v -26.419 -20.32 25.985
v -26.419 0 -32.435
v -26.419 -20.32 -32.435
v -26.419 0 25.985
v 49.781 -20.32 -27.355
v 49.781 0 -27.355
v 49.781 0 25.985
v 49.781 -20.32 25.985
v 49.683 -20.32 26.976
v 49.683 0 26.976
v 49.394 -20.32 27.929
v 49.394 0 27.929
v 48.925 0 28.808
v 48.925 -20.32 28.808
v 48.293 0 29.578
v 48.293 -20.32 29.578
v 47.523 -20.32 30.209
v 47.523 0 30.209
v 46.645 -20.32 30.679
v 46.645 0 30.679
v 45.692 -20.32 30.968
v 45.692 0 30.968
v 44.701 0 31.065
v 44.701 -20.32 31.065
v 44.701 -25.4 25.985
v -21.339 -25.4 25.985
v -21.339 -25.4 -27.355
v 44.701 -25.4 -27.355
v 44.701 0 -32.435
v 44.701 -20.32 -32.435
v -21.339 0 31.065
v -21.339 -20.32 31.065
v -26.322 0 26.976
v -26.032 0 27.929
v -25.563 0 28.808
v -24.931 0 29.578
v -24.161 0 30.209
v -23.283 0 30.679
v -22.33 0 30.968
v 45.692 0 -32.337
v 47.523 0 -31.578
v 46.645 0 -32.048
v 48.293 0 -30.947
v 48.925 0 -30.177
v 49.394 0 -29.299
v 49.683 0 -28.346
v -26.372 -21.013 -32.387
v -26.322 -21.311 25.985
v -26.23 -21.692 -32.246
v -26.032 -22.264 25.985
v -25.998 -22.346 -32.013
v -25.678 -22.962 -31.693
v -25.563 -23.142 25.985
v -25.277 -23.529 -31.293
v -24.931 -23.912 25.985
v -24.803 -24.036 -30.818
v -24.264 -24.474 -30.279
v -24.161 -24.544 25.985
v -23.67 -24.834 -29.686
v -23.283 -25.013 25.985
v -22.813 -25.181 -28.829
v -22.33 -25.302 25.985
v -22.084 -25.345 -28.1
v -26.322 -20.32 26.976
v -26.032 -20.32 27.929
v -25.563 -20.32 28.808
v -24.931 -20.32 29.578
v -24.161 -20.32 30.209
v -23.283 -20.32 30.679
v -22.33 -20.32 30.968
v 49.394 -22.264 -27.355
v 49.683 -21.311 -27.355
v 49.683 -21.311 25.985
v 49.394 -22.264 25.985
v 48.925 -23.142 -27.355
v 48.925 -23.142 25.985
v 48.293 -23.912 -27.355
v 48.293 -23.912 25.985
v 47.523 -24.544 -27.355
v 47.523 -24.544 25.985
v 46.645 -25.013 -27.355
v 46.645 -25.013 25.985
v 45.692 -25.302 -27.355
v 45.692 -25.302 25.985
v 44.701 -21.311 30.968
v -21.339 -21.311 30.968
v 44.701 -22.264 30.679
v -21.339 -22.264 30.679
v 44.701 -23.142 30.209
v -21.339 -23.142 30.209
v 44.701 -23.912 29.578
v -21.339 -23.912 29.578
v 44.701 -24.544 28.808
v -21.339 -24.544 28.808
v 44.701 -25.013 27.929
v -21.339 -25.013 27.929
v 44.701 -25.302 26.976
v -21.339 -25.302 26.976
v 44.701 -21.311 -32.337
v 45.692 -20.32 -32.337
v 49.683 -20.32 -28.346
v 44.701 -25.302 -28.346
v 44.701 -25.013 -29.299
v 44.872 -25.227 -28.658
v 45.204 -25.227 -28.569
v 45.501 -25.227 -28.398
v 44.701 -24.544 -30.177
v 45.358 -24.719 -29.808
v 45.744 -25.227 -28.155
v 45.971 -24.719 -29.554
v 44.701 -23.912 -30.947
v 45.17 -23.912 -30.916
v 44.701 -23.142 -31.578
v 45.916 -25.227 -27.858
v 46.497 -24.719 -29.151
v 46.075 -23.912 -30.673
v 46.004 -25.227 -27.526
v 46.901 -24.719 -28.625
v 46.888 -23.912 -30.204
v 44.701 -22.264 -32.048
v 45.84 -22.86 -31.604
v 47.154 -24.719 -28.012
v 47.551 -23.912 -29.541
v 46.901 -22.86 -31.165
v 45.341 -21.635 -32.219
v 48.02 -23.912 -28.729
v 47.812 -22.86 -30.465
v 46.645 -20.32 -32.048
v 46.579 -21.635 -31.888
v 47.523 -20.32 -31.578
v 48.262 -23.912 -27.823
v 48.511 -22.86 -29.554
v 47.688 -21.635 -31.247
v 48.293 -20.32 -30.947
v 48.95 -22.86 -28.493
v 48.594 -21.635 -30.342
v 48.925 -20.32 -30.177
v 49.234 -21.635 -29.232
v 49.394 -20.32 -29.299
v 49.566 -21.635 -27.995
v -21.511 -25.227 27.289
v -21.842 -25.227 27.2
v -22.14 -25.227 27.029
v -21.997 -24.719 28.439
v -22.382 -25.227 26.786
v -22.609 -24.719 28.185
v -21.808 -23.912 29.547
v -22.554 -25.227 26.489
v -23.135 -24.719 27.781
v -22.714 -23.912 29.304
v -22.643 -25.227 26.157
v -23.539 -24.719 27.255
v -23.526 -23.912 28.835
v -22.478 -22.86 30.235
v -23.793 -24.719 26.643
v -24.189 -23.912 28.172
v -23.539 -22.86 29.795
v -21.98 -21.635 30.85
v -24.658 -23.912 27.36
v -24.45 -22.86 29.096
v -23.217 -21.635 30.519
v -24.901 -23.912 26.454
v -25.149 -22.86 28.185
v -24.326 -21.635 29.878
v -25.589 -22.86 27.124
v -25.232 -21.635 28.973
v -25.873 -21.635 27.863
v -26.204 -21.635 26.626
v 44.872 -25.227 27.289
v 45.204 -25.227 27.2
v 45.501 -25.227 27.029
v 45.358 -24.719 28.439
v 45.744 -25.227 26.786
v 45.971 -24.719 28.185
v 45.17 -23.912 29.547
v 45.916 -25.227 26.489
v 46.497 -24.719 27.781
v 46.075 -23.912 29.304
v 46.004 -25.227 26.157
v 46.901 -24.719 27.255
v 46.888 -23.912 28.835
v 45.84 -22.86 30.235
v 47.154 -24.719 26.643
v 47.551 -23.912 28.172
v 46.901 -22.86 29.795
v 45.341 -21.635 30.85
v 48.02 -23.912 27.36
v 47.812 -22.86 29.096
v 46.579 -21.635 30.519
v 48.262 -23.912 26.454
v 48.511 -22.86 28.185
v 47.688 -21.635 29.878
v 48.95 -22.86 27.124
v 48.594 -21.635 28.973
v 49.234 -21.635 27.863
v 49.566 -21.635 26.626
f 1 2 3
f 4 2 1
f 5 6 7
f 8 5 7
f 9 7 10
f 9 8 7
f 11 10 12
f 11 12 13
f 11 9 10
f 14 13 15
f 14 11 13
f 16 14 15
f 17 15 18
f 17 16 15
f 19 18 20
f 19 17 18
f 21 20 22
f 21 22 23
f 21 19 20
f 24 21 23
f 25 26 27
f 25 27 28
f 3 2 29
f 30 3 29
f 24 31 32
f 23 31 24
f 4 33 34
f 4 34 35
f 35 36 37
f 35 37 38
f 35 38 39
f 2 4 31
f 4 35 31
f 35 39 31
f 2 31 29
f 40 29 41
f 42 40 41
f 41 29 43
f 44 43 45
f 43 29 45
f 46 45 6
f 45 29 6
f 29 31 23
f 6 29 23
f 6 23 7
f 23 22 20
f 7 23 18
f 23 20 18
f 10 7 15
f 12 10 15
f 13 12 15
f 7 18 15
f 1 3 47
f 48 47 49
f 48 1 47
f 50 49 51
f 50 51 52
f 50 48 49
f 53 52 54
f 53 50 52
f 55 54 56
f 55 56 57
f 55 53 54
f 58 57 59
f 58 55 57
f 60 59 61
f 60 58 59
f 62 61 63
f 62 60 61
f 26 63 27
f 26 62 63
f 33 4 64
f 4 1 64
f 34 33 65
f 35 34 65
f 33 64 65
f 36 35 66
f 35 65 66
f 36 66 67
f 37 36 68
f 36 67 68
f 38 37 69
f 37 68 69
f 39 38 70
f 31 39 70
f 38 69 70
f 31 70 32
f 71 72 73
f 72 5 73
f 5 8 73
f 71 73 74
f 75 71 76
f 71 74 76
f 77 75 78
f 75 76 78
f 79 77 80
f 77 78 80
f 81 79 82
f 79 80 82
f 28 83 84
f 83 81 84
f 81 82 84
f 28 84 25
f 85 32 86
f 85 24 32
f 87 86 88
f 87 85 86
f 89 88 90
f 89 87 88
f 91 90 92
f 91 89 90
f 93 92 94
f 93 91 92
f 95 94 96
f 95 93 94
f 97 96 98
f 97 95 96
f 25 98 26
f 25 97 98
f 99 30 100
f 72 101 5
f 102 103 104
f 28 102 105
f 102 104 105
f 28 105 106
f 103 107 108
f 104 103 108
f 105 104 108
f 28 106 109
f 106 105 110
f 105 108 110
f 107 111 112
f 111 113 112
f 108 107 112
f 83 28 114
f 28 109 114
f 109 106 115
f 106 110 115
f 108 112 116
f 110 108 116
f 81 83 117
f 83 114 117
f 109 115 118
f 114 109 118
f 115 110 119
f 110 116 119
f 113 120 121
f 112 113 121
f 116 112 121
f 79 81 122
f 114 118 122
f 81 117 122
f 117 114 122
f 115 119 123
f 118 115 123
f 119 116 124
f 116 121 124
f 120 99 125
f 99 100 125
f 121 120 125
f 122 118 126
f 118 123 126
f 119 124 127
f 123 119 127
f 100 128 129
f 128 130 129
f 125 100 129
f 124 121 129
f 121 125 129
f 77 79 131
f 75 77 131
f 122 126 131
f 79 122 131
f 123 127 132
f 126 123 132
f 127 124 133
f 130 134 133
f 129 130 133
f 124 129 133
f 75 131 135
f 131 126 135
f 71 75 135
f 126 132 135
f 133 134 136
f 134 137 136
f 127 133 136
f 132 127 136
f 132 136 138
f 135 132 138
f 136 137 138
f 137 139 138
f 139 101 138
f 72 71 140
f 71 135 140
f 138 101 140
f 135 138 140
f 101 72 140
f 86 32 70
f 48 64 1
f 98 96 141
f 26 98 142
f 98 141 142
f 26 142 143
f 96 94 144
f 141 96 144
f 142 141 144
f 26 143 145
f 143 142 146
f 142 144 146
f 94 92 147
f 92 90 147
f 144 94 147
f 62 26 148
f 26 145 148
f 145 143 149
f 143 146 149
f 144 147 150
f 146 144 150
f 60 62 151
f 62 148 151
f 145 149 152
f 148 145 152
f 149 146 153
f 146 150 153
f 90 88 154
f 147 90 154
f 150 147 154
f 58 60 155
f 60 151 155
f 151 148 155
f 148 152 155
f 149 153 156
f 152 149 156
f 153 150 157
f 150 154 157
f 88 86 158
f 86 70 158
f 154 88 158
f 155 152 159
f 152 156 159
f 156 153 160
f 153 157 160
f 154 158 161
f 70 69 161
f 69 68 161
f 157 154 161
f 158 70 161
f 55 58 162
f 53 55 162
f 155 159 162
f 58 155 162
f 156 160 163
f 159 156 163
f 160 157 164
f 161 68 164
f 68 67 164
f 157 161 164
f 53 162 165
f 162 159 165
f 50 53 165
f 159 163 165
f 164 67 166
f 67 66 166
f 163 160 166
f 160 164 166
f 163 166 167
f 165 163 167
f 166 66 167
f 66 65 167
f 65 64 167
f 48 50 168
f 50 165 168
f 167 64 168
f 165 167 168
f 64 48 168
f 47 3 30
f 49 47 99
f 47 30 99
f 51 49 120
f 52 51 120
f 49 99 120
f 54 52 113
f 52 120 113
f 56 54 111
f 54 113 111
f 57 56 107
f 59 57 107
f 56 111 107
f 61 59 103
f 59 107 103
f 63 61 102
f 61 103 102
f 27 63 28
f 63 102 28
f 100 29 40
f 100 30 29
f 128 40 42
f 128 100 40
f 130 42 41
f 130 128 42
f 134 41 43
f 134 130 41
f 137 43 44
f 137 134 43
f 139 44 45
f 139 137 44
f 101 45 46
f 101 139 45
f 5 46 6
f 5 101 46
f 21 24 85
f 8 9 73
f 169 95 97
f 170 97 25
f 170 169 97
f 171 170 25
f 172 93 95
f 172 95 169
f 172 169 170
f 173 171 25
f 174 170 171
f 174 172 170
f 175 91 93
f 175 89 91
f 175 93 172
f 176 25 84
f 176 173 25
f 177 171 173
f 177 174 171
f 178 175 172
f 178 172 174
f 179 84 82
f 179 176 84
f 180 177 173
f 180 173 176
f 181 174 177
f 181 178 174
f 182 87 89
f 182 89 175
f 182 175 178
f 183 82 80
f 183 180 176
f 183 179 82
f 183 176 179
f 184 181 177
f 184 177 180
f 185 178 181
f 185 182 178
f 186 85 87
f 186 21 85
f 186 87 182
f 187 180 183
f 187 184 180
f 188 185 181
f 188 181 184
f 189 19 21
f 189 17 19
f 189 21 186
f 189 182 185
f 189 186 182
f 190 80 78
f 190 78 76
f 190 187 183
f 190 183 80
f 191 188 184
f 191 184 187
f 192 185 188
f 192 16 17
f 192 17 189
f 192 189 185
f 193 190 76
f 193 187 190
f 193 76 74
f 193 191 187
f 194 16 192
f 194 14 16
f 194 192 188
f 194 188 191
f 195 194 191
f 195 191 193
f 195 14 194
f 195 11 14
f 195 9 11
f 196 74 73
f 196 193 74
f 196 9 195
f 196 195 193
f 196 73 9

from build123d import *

# Parameters (mm, degrees)
F0_W     = 76.2
F0_H     = 63.5
F1_DEPTH = 25.4
F2_R     = 5.08


with BuildPart() as f1:
    # F0 (on Front) → F1 (new body)
    with BuildSketch(Plane.XZ):
        with Locations((11.68086, -0.684561)):
            Rectangle(F0_W, F0_H)
    extrude(amount=F1_DEPTH)

    # F2
    f2_edges = [f1.edges().sort_by_distance(p)[0] for p in [
        (49.78086, -12.7, 31.065439),
        (-26.41914, -12.7, 31.065439),
        (49.78086, -12.7, -32.434561),
        (11.68086, -25.4, 31.065439),
        (-26.41914, -25.4, -0.684561),
        (11.68086, -25.4, -32.434561),
        (49.78086, -25.4, -0.684561),
    ]]
    fillet(f2_edges, radius=F2_R)


solid = f1.part
